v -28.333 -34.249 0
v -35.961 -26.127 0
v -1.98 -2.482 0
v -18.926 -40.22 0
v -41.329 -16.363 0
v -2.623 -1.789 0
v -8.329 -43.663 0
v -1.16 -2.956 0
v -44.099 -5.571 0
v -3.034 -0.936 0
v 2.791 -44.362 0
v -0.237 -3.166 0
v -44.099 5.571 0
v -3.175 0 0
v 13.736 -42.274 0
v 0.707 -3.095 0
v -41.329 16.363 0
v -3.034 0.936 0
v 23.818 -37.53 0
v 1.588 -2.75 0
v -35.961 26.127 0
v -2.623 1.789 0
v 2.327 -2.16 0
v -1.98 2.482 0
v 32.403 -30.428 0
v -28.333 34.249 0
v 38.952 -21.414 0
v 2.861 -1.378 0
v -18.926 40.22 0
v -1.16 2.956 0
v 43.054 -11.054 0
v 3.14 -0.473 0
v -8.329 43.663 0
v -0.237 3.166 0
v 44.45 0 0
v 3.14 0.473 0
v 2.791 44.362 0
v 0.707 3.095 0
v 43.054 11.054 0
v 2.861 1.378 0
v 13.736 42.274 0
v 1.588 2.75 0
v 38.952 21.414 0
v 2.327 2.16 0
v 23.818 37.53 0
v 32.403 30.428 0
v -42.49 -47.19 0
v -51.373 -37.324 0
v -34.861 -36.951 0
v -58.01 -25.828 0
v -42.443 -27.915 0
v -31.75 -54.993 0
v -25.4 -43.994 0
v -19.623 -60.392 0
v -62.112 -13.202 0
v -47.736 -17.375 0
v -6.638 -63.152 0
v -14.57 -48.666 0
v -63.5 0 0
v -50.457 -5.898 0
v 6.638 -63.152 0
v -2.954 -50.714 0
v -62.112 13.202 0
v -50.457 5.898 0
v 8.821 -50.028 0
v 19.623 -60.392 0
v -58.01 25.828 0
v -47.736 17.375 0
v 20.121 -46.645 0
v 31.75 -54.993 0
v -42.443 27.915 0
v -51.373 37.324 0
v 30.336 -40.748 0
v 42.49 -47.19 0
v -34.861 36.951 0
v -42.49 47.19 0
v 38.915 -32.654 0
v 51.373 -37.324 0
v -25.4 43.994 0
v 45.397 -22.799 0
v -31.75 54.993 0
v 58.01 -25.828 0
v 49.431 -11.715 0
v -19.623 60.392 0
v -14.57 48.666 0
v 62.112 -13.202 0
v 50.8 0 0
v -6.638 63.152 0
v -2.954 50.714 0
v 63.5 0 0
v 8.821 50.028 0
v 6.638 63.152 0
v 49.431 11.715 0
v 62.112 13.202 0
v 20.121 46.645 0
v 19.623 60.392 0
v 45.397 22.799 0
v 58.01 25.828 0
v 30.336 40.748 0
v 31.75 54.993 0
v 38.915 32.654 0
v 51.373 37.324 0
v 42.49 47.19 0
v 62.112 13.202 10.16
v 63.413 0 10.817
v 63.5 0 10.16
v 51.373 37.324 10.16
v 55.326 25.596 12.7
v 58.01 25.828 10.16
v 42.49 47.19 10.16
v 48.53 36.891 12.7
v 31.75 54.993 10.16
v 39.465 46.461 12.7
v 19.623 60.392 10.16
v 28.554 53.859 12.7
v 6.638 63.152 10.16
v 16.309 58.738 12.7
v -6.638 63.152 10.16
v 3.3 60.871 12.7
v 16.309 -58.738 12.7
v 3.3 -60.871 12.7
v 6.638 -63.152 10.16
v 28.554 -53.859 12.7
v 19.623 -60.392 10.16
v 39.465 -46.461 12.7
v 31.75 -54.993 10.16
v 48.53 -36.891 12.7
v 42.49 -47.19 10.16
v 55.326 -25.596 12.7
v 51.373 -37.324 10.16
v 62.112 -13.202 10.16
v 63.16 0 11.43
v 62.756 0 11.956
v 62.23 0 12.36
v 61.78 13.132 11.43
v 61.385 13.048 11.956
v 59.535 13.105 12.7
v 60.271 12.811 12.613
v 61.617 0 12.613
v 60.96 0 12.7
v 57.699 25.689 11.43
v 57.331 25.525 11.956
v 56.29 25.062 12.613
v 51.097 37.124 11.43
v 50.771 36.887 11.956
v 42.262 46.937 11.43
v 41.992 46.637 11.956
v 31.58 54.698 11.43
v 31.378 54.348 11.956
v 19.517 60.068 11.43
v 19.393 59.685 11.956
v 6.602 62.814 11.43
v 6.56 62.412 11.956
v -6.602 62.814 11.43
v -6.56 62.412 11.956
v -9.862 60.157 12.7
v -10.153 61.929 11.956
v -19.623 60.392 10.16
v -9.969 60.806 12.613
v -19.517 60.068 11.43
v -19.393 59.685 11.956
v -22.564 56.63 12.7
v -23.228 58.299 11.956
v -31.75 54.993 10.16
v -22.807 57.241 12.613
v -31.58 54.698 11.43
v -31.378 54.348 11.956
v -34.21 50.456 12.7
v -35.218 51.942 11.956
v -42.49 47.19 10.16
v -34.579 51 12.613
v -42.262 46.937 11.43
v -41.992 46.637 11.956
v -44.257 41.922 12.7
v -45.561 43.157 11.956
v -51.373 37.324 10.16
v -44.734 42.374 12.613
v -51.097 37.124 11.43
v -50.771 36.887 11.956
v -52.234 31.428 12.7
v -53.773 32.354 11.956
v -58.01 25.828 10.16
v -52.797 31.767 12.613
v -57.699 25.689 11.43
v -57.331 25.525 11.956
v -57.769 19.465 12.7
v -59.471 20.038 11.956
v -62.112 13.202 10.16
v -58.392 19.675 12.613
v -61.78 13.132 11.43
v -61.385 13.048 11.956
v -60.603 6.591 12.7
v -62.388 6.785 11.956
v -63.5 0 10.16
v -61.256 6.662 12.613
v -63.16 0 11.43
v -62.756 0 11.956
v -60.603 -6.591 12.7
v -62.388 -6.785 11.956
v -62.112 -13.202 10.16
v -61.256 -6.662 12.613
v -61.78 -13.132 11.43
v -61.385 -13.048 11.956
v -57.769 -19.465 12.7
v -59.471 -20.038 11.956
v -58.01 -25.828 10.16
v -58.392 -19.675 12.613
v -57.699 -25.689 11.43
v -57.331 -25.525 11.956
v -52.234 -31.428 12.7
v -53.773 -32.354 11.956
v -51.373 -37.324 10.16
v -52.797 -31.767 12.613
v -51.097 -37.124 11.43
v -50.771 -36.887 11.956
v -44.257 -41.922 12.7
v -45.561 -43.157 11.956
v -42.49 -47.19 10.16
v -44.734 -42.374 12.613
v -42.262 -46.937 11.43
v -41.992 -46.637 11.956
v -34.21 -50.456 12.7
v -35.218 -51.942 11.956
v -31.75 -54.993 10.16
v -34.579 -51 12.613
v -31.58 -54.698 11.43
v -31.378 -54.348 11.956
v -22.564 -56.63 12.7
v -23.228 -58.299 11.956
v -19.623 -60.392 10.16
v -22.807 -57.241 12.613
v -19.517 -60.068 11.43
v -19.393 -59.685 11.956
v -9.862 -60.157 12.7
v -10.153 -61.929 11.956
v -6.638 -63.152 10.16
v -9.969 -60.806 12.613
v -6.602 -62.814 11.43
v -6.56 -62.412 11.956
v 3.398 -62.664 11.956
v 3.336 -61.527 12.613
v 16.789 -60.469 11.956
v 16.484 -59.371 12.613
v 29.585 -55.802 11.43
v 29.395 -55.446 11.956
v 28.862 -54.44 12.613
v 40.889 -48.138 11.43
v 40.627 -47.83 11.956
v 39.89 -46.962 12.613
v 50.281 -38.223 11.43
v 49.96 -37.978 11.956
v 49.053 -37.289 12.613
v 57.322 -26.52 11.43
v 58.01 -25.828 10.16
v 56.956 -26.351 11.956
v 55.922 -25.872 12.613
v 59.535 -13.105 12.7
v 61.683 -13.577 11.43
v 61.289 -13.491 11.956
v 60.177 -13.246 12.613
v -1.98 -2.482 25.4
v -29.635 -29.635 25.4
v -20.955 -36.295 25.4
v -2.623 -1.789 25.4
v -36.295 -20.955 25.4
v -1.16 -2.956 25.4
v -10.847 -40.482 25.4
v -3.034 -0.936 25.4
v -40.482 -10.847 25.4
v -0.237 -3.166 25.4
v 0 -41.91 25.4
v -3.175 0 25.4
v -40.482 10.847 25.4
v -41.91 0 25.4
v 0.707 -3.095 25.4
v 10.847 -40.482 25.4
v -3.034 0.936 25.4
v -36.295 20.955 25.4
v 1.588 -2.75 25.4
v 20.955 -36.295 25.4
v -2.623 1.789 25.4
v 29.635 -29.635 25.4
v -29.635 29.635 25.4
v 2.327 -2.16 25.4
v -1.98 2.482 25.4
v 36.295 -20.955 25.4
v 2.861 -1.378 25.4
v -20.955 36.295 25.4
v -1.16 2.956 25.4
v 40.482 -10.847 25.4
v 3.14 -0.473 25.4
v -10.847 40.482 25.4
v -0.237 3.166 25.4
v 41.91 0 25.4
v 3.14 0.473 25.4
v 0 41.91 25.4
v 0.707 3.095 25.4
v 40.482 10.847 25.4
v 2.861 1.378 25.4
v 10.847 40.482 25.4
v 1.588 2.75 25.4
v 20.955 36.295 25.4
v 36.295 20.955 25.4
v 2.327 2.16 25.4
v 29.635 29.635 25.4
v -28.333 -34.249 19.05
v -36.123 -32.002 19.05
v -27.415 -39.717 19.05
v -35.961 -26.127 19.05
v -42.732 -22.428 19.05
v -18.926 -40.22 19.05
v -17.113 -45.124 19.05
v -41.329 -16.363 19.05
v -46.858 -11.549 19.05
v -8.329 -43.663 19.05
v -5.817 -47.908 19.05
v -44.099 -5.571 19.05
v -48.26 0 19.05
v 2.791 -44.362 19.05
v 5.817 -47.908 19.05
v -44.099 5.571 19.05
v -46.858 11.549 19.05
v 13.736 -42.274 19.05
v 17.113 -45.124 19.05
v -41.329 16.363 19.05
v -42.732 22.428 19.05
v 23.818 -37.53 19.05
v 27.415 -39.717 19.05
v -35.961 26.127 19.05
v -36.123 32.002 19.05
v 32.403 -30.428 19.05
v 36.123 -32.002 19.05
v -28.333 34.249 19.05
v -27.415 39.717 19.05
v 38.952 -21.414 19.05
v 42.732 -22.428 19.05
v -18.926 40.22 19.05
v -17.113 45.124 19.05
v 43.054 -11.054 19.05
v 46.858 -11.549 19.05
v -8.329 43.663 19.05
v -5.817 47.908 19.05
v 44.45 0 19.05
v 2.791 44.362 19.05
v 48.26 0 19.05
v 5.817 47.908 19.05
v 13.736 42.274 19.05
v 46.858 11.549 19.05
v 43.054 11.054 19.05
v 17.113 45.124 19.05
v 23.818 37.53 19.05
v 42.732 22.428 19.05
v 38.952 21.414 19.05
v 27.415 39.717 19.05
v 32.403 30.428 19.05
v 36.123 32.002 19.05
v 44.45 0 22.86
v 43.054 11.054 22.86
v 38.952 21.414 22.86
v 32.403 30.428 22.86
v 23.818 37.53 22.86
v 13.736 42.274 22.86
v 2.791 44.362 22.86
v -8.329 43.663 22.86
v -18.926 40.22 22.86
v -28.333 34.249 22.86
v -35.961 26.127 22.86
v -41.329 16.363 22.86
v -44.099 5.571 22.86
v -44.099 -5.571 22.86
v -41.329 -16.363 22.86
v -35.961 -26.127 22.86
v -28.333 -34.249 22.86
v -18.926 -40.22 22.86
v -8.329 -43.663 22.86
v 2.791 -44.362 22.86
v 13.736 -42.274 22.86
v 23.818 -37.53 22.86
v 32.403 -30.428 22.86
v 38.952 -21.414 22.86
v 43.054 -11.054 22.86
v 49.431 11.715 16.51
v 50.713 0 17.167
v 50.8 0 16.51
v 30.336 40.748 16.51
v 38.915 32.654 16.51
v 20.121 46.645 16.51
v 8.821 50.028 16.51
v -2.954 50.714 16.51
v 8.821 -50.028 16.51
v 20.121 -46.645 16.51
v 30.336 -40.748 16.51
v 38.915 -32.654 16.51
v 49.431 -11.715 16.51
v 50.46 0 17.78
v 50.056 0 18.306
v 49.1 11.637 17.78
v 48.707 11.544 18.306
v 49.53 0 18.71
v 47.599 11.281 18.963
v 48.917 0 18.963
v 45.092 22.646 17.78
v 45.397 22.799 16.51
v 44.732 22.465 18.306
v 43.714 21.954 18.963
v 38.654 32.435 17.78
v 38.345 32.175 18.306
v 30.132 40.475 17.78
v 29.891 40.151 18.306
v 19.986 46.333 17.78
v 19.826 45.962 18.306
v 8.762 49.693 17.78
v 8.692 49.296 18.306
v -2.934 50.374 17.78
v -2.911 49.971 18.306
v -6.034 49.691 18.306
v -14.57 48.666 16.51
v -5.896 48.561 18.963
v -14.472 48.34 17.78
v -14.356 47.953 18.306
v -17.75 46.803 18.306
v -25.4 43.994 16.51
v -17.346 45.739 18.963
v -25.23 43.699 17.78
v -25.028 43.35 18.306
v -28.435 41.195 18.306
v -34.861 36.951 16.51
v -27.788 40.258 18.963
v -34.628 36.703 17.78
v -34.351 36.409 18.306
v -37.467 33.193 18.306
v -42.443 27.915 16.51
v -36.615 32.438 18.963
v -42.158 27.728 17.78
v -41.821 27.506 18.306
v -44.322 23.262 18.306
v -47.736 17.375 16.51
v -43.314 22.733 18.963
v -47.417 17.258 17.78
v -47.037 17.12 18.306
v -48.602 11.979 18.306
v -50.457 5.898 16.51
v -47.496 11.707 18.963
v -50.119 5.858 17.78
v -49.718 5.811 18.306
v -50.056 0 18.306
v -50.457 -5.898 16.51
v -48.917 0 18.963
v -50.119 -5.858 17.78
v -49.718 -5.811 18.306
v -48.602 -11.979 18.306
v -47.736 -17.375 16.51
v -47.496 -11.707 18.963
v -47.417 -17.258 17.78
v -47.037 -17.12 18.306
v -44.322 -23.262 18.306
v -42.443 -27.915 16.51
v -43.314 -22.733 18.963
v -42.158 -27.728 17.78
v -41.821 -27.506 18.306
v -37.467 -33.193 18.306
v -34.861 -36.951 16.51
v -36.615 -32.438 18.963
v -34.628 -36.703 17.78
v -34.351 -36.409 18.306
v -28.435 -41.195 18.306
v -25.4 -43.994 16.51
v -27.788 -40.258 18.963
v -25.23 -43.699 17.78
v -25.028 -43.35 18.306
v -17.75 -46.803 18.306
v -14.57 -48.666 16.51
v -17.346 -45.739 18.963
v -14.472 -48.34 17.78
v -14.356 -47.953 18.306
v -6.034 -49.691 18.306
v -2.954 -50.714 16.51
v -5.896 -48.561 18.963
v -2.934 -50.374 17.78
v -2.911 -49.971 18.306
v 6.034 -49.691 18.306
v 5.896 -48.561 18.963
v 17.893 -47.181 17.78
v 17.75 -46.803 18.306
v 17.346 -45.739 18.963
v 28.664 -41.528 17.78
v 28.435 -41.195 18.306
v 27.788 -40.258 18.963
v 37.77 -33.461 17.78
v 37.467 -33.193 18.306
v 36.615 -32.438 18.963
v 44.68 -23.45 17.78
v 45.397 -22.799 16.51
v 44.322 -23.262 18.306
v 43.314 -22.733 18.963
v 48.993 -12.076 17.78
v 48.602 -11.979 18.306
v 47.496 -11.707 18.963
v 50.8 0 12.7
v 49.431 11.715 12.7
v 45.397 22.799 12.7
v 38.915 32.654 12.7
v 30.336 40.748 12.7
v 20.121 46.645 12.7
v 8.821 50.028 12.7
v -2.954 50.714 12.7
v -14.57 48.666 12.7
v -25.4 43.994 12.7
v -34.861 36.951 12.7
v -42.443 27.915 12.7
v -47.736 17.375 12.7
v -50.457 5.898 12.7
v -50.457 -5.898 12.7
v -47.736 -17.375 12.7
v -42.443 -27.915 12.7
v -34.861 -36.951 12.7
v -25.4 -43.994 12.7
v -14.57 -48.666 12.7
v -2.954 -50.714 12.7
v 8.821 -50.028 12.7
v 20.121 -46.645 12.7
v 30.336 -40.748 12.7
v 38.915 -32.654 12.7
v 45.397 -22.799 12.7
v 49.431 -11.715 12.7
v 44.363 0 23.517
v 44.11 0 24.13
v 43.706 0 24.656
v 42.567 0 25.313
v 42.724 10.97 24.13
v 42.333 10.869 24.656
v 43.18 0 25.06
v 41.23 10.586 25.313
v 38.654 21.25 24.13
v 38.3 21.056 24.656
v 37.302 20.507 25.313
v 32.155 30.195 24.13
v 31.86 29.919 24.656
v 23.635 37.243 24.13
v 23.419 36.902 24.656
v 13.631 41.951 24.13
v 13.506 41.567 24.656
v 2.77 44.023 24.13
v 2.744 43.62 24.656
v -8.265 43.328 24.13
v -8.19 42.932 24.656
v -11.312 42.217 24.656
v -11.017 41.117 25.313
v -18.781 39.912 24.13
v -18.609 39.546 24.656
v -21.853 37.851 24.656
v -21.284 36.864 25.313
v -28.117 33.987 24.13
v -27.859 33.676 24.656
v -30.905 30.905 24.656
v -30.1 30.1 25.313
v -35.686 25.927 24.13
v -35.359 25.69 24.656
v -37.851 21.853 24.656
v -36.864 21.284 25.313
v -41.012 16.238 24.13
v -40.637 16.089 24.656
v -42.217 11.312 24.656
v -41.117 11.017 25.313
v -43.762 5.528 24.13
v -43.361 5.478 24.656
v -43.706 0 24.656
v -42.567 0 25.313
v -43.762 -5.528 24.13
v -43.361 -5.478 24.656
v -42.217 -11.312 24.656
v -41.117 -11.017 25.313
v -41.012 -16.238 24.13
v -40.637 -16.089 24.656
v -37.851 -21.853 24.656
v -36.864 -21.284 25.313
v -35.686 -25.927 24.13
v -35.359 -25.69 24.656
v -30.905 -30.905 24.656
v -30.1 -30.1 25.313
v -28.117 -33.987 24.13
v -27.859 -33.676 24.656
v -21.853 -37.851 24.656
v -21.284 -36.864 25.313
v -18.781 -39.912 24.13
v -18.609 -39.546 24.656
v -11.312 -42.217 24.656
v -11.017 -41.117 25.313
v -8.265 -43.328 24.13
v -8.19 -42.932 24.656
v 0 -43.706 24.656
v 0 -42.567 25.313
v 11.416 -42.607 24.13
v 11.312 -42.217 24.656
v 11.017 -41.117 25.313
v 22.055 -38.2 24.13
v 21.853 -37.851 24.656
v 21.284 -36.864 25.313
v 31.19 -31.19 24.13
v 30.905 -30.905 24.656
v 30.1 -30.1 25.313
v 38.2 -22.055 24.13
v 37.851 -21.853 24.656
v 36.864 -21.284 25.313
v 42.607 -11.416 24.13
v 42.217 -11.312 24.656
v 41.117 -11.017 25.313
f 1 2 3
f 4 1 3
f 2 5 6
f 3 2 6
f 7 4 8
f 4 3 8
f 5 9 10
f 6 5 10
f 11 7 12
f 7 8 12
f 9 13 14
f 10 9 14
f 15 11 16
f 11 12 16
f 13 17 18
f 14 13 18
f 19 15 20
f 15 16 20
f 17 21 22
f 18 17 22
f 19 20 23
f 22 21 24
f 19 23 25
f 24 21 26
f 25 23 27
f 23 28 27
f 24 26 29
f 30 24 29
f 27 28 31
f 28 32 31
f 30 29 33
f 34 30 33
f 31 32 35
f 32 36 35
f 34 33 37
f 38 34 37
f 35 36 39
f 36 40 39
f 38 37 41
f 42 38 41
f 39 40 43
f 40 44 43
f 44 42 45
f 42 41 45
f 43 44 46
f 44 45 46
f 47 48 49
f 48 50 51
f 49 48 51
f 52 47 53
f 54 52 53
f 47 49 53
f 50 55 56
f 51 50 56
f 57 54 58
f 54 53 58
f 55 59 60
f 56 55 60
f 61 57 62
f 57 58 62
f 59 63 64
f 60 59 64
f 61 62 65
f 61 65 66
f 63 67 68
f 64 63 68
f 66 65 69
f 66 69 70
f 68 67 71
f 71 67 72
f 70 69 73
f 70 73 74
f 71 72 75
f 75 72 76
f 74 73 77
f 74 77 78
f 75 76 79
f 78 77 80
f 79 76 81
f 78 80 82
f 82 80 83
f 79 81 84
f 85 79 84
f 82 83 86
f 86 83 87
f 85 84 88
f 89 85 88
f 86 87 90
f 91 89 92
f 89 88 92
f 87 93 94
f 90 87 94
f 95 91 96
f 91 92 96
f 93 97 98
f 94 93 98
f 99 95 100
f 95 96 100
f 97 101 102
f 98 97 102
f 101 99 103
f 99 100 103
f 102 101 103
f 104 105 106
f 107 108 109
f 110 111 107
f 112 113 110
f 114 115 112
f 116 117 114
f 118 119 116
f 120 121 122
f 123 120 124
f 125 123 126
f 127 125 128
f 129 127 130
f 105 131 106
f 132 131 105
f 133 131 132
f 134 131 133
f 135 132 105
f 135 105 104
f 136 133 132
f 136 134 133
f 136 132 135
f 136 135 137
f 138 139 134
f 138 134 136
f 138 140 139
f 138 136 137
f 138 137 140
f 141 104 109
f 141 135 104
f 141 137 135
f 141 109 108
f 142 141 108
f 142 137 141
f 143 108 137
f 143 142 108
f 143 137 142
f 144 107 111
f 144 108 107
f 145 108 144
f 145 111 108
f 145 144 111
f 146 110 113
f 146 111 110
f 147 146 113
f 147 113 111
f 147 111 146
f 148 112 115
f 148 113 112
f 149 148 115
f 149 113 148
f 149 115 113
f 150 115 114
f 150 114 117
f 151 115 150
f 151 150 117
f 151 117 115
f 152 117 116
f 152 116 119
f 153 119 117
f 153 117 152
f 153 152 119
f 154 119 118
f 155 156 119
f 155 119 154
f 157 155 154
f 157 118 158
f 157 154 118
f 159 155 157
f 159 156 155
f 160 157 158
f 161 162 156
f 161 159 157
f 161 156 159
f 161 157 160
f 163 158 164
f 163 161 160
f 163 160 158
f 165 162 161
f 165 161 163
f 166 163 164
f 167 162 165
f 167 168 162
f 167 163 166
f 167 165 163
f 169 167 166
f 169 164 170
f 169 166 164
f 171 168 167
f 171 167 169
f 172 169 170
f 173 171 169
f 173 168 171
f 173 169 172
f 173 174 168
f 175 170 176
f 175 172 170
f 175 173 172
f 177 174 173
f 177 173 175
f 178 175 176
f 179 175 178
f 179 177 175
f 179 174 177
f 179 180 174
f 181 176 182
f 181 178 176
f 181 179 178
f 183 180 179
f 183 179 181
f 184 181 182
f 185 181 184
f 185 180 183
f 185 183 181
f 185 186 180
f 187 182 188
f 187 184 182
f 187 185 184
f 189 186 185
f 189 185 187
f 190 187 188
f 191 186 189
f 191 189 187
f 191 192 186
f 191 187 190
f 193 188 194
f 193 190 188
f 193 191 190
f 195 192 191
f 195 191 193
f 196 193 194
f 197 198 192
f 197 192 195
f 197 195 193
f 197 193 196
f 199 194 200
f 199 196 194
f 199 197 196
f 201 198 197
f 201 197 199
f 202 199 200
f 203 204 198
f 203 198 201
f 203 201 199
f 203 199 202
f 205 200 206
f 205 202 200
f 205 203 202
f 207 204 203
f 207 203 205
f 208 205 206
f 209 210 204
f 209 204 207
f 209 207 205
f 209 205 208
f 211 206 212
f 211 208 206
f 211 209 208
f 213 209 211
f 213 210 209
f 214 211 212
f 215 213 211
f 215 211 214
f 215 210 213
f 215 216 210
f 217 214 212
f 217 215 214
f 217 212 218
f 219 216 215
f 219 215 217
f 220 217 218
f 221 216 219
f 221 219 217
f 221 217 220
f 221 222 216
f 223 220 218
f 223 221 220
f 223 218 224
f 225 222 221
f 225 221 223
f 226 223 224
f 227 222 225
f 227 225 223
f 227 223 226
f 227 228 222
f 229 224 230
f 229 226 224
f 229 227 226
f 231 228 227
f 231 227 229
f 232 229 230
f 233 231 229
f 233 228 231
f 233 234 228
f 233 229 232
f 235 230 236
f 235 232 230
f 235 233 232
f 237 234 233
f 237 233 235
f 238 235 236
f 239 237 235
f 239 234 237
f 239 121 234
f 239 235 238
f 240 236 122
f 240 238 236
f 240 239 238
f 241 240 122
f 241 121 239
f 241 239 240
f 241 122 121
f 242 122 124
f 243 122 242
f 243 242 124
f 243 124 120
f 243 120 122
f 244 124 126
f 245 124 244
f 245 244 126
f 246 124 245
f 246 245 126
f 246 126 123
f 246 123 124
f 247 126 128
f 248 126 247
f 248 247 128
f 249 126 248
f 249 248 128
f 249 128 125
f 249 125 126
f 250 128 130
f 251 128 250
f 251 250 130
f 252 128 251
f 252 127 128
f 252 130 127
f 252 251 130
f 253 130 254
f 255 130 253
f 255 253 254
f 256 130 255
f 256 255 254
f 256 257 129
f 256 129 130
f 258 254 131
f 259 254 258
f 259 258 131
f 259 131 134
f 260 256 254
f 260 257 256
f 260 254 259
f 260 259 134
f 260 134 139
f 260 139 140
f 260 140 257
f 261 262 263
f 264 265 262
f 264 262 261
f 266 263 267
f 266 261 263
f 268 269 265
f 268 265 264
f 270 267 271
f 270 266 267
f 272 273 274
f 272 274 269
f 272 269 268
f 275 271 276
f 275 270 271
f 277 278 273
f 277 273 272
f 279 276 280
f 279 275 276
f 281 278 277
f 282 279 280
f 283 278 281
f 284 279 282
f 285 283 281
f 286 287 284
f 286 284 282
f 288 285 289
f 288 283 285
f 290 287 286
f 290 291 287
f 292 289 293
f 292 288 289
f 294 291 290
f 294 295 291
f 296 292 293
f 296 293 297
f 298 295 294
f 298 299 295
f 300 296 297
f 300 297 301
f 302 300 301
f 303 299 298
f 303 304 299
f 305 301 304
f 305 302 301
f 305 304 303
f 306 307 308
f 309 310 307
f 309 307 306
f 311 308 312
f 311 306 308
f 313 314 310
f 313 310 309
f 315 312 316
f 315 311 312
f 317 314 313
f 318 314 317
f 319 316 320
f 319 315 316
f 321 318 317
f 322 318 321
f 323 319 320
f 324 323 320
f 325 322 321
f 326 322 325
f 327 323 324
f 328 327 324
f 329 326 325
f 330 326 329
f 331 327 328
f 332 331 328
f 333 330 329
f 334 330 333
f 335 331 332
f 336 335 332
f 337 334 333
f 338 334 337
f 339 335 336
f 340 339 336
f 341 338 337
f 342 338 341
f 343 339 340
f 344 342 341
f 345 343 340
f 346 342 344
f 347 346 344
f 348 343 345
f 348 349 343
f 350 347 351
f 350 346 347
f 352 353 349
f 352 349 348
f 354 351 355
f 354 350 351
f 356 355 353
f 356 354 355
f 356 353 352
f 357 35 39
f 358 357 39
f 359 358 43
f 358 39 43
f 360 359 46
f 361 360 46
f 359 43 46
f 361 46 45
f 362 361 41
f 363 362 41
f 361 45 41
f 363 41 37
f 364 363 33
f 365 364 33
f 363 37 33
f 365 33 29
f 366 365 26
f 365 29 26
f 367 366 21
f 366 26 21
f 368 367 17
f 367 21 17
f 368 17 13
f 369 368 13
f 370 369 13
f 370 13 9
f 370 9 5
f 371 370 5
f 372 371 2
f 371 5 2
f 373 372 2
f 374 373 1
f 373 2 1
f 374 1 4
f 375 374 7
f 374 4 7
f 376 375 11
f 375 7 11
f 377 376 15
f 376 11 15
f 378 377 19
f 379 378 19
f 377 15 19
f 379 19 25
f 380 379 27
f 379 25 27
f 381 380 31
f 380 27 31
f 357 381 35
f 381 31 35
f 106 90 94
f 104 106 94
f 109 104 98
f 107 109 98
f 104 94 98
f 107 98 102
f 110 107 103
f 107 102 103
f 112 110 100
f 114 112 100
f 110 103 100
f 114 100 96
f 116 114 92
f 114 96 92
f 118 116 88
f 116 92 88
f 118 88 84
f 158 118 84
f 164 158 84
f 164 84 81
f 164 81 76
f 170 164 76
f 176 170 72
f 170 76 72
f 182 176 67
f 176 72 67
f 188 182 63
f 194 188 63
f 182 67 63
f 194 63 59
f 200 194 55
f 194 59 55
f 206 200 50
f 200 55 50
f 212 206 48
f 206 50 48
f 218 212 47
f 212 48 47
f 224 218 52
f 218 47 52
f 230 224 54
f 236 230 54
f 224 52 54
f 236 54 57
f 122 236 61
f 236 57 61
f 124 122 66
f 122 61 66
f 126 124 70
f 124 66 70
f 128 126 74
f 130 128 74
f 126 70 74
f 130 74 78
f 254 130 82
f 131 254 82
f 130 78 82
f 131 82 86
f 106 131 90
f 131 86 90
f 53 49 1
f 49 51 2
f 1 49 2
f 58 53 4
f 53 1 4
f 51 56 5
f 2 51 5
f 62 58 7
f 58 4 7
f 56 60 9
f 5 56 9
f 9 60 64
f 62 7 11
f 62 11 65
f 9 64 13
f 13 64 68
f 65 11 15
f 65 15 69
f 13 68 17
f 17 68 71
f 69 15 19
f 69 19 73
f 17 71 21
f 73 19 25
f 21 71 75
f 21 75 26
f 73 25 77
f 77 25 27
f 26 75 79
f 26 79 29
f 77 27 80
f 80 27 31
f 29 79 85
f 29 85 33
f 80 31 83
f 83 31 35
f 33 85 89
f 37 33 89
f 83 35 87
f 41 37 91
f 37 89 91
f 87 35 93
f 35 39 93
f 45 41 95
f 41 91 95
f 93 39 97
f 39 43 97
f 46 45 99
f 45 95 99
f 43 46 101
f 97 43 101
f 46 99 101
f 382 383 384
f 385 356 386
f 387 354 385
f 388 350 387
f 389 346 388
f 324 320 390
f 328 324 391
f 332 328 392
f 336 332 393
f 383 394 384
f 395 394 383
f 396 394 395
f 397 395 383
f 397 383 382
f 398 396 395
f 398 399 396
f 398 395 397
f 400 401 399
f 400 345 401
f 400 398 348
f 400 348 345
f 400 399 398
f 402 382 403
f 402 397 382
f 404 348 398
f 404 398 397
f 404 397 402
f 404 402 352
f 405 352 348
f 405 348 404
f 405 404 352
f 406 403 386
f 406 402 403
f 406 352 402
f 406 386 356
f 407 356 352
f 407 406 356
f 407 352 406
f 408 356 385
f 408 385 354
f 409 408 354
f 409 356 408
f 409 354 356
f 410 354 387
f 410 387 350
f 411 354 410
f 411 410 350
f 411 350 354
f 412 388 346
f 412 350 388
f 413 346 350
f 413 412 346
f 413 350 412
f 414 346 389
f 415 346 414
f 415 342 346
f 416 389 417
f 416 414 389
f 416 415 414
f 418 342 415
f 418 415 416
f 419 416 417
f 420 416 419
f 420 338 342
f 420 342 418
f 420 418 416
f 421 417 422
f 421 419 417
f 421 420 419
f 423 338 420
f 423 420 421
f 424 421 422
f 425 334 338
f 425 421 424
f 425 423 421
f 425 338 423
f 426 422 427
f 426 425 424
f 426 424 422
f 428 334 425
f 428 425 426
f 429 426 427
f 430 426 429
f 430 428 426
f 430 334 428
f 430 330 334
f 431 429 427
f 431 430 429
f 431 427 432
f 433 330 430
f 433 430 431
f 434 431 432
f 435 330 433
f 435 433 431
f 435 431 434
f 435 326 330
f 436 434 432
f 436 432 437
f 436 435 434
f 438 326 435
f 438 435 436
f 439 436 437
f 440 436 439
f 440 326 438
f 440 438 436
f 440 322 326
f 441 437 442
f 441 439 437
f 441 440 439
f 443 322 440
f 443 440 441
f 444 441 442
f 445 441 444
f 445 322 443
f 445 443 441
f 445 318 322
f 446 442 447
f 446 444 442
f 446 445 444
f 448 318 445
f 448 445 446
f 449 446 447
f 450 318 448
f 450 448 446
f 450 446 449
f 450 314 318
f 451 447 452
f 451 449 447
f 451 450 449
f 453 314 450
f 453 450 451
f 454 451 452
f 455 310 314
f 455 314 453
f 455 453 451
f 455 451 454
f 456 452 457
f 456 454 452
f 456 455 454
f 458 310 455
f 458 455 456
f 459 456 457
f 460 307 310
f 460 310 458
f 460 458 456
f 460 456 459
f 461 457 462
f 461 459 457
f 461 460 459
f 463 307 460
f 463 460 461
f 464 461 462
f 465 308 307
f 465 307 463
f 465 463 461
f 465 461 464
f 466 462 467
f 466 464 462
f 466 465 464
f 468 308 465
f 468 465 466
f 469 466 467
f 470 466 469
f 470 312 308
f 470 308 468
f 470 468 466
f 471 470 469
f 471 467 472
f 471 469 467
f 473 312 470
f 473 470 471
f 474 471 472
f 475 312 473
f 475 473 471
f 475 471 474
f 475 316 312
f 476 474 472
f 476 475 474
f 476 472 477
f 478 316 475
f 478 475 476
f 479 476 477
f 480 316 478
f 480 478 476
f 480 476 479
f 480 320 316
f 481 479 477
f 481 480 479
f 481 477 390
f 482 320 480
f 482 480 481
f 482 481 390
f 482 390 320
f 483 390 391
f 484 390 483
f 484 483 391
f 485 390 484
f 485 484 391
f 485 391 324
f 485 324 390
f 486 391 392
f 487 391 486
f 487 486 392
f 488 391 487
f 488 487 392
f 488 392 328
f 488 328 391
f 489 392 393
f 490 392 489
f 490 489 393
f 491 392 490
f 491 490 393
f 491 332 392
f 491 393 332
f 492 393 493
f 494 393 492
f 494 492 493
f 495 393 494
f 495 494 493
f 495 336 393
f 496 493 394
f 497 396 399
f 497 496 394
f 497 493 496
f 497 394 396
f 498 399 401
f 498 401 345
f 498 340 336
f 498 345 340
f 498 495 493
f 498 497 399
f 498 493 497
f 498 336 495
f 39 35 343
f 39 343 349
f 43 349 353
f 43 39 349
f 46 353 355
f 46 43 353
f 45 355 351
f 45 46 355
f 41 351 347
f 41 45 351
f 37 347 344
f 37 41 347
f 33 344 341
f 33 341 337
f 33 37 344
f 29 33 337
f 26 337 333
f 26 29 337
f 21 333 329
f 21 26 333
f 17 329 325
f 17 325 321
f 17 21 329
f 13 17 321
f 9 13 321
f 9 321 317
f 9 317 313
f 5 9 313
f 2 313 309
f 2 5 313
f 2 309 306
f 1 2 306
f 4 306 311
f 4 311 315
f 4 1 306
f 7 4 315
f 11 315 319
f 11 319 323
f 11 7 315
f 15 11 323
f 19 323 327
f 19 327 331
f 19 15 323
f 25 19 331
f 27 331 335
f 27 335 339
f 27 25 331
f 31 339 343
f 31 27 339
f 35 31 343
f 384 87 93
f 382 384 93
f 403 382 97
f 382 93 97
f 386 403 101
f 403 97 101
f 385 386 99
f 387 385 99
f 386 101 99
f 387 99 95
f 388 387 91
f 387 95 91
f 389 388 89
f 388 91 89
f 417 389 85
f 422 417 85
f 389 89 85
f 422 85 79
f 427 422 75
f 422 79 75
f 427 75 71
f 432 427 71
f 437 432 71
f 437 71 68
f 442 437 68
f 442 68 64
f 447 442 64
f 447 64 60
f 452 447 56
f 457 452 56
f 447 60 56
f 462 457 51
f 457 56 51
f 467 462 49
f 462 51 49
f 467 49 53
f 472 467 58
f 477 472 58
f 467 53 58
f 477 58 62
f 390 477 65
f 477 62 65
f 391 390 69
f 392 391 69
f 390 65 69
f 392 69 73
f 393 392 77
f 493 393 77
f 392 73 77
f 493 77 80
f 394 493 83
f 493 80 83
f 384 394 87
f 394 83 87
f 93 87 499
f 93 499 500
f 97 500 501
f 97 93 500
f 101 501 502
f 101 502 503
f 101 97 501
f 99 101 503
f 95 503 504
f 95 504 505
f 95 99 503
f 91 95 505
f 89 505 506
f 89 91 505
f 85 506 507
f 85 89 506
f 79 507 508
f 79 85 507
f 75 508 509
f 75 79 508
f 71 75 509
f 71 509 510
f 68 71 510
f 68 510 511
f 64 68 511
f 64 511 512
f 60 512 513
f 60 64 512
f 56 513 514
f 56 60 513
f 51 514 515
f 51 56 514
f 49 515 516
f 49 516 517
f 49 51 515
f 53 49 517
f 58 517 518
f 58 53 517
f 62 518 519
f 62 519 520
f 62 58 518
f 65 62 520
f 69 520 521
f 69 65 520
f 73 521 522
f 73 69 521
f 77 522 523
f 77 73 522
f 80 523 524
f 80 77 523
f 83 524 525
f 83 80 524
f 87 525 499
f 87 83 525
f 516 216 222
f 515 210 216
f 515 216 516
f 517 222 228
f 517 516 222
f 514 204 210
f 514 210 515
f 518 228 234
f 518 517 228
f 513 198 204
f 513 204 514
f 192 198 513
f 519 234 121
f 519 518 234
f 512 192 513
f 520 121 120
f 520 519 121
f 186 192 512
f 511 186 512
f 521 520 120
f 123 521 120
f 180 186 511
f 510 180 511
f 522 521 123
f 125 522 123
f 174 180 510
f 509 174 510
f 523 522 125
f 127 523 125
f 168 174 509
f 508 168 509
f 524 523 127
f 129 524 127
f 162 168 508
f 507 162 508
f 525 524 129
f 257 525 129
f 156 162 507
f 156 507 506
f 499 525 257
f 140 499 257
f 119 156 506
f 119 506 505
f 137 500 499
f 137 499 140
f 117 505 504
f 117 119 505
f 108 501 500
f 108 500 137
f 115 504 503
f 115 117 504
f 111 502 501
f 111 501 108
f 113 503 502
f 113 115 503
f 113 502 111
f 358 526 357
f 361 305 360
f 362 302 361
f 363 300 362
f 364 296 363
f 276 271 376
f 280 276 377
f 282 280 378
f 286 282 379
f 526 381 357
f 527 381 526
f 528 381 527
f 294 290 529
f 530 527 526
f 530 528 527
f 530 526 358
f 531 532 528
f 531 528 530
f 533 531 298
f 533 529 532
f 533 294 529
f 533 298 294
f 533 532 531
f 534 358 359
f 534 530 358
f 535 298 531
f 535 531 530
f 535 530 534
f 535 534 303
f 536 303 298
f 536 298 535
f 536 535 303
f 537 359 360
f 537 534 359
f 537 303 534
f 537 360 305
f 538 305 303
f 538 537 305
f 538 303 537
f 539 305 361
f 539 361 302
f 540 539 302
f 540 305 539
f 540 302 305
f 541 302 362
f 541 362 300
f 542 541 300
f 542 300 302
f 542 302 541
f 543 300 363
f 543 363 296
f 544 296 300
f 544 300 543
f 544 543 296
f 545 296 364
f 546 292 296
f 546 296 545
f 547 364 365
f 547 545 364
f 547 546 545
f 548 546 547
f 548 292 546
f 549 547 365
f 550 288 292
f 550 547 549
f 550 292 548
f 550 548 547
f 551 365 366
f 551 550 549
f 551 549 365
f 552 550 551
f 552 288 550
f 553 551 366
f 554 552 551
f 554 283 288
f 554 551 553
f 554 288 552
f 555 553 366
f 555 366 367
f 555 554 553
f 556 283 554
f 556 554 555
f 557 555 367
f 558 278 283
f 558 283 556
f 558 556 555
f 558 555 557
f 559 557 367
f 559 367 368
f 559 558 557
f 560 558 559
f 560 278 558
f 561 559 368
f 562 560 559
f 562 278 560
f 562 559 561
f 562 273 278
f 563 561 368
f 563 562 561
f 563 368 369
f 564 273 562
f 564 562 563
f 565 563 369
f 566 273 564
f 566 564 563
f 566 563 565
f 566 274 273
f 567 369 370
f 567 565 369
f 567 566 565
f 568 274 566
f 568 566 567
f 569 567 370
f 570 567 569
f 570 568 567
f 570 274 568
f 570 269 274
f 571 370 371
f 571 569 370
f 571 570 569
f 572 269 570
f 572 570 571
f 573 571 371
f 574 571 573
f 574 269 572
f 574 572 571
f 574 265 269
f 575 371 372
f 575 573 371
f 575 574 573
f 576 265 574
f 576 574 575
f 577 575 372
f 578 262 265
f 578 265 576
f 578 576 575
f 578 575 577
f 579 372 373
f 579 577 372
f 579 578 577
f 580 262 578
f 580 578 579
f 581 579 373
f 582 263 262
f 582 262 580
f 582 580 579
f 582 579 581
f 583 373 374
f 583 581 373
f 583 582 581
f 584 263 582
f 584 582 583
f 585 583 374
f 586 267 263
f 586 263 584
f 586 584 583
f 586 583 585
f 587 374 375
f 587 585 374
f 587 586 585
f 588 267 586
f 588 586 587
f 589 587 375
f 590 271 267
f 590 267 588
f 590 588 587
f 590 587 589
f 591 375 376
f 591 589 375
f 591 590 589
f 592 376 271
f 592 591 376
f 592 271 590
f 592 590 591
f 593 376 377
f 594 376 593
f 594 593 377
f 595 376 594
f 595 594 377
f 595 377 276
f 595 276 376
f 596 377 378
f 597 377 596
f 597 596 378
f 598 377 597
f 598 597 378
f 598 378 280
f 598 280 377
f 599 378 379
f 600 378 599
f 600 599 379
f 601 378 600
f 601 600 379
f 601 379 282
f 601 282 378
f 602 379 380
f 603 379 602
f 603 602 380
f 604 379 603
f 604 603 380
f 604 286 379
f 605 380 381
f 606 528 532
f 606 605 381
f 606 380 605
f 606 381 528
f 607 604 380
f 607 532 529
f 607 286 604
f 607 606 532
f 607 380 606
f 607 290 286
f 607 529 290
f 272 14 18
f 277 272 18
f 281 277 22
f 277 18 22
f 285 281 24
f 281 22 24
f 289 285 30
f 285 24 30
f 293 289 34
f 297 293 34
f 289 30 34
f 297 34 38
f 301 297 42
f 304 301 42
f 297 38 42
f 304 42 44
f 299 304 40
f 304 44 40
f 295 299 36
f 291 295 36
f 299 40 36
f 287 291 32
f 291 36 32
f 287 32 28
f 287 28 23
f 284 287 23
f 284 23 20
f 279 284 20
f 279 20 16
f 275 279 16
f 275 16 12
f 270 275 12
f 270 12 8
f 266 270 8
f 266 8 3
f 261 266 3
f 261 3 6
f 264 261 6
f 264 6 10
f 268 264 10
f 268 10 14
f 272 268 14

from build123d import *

# Parameters (mm, degrees)
F0_R     = 44.45
F1_DEPTH = 25.4
F0_R_2   = 63.5
F0_R_3   = 50.8
F2_DEPTH = 12.7
F3_DEPTH = 19.05
F5_D     = 6.35
F6_R     = 2.54
F6_2_R   = 2.54
F6_3_R   = 2.54


with BuildPart() as f1:
    # F0 (on Top) → F1 (new body)
    with BuildSketch(Plane.XY):
        Circle(F0_R)
    extrude(amount=F1_DEPTH)

    # F5 (through all)
    with Locations(Plane.XY.offset(25.4)):
        with Locations((0, 0)):
            Hole(F5_D / 2)

    # F6
    f6_edges = [f1.edges().sort_by_distance(p)[0] for p in [
        (-44.45, 0, 25.4),
    ]]
    fillet(f6_edges, radius=F6_R)


with BuildPart() as f2:
    # F0 (on Top) → F2 (new body)
    with BuildSketch(Plane.XY):
        Circle(F0_R_2)
        Circle(F0_R_3, mode=Mode.SUBTRACT)
    extrude(amount=F2_DEPTH)

    # F6#3
    f6_3_edges = [f2.edges().sort_by_distance(p)[0] for p in [
        (-63.5, 0, 12.7),
    ]]
    fillet(f6_3_edges, radius=F6_3_R)


with BuildPart() as f3:
    # F0 (on Top) → F3 (new body)
    with BuildSketch(Plane.XY):
        Circle(F0_R_3)
        Circle(F0_R, mode=Mode.SUBTRACT)
    extrude(amount=F3_DEPTH)

    # F6#2
    f6_2_edges = [f3.edges().sort_by_distance(p)[0] for p in [
        (-50.8, 0, 19.05),
    ]]
    fillet(f6_2_edges, radius=F6_2_R)


solid = Compound([f1.part, f2.part, f3.part])
